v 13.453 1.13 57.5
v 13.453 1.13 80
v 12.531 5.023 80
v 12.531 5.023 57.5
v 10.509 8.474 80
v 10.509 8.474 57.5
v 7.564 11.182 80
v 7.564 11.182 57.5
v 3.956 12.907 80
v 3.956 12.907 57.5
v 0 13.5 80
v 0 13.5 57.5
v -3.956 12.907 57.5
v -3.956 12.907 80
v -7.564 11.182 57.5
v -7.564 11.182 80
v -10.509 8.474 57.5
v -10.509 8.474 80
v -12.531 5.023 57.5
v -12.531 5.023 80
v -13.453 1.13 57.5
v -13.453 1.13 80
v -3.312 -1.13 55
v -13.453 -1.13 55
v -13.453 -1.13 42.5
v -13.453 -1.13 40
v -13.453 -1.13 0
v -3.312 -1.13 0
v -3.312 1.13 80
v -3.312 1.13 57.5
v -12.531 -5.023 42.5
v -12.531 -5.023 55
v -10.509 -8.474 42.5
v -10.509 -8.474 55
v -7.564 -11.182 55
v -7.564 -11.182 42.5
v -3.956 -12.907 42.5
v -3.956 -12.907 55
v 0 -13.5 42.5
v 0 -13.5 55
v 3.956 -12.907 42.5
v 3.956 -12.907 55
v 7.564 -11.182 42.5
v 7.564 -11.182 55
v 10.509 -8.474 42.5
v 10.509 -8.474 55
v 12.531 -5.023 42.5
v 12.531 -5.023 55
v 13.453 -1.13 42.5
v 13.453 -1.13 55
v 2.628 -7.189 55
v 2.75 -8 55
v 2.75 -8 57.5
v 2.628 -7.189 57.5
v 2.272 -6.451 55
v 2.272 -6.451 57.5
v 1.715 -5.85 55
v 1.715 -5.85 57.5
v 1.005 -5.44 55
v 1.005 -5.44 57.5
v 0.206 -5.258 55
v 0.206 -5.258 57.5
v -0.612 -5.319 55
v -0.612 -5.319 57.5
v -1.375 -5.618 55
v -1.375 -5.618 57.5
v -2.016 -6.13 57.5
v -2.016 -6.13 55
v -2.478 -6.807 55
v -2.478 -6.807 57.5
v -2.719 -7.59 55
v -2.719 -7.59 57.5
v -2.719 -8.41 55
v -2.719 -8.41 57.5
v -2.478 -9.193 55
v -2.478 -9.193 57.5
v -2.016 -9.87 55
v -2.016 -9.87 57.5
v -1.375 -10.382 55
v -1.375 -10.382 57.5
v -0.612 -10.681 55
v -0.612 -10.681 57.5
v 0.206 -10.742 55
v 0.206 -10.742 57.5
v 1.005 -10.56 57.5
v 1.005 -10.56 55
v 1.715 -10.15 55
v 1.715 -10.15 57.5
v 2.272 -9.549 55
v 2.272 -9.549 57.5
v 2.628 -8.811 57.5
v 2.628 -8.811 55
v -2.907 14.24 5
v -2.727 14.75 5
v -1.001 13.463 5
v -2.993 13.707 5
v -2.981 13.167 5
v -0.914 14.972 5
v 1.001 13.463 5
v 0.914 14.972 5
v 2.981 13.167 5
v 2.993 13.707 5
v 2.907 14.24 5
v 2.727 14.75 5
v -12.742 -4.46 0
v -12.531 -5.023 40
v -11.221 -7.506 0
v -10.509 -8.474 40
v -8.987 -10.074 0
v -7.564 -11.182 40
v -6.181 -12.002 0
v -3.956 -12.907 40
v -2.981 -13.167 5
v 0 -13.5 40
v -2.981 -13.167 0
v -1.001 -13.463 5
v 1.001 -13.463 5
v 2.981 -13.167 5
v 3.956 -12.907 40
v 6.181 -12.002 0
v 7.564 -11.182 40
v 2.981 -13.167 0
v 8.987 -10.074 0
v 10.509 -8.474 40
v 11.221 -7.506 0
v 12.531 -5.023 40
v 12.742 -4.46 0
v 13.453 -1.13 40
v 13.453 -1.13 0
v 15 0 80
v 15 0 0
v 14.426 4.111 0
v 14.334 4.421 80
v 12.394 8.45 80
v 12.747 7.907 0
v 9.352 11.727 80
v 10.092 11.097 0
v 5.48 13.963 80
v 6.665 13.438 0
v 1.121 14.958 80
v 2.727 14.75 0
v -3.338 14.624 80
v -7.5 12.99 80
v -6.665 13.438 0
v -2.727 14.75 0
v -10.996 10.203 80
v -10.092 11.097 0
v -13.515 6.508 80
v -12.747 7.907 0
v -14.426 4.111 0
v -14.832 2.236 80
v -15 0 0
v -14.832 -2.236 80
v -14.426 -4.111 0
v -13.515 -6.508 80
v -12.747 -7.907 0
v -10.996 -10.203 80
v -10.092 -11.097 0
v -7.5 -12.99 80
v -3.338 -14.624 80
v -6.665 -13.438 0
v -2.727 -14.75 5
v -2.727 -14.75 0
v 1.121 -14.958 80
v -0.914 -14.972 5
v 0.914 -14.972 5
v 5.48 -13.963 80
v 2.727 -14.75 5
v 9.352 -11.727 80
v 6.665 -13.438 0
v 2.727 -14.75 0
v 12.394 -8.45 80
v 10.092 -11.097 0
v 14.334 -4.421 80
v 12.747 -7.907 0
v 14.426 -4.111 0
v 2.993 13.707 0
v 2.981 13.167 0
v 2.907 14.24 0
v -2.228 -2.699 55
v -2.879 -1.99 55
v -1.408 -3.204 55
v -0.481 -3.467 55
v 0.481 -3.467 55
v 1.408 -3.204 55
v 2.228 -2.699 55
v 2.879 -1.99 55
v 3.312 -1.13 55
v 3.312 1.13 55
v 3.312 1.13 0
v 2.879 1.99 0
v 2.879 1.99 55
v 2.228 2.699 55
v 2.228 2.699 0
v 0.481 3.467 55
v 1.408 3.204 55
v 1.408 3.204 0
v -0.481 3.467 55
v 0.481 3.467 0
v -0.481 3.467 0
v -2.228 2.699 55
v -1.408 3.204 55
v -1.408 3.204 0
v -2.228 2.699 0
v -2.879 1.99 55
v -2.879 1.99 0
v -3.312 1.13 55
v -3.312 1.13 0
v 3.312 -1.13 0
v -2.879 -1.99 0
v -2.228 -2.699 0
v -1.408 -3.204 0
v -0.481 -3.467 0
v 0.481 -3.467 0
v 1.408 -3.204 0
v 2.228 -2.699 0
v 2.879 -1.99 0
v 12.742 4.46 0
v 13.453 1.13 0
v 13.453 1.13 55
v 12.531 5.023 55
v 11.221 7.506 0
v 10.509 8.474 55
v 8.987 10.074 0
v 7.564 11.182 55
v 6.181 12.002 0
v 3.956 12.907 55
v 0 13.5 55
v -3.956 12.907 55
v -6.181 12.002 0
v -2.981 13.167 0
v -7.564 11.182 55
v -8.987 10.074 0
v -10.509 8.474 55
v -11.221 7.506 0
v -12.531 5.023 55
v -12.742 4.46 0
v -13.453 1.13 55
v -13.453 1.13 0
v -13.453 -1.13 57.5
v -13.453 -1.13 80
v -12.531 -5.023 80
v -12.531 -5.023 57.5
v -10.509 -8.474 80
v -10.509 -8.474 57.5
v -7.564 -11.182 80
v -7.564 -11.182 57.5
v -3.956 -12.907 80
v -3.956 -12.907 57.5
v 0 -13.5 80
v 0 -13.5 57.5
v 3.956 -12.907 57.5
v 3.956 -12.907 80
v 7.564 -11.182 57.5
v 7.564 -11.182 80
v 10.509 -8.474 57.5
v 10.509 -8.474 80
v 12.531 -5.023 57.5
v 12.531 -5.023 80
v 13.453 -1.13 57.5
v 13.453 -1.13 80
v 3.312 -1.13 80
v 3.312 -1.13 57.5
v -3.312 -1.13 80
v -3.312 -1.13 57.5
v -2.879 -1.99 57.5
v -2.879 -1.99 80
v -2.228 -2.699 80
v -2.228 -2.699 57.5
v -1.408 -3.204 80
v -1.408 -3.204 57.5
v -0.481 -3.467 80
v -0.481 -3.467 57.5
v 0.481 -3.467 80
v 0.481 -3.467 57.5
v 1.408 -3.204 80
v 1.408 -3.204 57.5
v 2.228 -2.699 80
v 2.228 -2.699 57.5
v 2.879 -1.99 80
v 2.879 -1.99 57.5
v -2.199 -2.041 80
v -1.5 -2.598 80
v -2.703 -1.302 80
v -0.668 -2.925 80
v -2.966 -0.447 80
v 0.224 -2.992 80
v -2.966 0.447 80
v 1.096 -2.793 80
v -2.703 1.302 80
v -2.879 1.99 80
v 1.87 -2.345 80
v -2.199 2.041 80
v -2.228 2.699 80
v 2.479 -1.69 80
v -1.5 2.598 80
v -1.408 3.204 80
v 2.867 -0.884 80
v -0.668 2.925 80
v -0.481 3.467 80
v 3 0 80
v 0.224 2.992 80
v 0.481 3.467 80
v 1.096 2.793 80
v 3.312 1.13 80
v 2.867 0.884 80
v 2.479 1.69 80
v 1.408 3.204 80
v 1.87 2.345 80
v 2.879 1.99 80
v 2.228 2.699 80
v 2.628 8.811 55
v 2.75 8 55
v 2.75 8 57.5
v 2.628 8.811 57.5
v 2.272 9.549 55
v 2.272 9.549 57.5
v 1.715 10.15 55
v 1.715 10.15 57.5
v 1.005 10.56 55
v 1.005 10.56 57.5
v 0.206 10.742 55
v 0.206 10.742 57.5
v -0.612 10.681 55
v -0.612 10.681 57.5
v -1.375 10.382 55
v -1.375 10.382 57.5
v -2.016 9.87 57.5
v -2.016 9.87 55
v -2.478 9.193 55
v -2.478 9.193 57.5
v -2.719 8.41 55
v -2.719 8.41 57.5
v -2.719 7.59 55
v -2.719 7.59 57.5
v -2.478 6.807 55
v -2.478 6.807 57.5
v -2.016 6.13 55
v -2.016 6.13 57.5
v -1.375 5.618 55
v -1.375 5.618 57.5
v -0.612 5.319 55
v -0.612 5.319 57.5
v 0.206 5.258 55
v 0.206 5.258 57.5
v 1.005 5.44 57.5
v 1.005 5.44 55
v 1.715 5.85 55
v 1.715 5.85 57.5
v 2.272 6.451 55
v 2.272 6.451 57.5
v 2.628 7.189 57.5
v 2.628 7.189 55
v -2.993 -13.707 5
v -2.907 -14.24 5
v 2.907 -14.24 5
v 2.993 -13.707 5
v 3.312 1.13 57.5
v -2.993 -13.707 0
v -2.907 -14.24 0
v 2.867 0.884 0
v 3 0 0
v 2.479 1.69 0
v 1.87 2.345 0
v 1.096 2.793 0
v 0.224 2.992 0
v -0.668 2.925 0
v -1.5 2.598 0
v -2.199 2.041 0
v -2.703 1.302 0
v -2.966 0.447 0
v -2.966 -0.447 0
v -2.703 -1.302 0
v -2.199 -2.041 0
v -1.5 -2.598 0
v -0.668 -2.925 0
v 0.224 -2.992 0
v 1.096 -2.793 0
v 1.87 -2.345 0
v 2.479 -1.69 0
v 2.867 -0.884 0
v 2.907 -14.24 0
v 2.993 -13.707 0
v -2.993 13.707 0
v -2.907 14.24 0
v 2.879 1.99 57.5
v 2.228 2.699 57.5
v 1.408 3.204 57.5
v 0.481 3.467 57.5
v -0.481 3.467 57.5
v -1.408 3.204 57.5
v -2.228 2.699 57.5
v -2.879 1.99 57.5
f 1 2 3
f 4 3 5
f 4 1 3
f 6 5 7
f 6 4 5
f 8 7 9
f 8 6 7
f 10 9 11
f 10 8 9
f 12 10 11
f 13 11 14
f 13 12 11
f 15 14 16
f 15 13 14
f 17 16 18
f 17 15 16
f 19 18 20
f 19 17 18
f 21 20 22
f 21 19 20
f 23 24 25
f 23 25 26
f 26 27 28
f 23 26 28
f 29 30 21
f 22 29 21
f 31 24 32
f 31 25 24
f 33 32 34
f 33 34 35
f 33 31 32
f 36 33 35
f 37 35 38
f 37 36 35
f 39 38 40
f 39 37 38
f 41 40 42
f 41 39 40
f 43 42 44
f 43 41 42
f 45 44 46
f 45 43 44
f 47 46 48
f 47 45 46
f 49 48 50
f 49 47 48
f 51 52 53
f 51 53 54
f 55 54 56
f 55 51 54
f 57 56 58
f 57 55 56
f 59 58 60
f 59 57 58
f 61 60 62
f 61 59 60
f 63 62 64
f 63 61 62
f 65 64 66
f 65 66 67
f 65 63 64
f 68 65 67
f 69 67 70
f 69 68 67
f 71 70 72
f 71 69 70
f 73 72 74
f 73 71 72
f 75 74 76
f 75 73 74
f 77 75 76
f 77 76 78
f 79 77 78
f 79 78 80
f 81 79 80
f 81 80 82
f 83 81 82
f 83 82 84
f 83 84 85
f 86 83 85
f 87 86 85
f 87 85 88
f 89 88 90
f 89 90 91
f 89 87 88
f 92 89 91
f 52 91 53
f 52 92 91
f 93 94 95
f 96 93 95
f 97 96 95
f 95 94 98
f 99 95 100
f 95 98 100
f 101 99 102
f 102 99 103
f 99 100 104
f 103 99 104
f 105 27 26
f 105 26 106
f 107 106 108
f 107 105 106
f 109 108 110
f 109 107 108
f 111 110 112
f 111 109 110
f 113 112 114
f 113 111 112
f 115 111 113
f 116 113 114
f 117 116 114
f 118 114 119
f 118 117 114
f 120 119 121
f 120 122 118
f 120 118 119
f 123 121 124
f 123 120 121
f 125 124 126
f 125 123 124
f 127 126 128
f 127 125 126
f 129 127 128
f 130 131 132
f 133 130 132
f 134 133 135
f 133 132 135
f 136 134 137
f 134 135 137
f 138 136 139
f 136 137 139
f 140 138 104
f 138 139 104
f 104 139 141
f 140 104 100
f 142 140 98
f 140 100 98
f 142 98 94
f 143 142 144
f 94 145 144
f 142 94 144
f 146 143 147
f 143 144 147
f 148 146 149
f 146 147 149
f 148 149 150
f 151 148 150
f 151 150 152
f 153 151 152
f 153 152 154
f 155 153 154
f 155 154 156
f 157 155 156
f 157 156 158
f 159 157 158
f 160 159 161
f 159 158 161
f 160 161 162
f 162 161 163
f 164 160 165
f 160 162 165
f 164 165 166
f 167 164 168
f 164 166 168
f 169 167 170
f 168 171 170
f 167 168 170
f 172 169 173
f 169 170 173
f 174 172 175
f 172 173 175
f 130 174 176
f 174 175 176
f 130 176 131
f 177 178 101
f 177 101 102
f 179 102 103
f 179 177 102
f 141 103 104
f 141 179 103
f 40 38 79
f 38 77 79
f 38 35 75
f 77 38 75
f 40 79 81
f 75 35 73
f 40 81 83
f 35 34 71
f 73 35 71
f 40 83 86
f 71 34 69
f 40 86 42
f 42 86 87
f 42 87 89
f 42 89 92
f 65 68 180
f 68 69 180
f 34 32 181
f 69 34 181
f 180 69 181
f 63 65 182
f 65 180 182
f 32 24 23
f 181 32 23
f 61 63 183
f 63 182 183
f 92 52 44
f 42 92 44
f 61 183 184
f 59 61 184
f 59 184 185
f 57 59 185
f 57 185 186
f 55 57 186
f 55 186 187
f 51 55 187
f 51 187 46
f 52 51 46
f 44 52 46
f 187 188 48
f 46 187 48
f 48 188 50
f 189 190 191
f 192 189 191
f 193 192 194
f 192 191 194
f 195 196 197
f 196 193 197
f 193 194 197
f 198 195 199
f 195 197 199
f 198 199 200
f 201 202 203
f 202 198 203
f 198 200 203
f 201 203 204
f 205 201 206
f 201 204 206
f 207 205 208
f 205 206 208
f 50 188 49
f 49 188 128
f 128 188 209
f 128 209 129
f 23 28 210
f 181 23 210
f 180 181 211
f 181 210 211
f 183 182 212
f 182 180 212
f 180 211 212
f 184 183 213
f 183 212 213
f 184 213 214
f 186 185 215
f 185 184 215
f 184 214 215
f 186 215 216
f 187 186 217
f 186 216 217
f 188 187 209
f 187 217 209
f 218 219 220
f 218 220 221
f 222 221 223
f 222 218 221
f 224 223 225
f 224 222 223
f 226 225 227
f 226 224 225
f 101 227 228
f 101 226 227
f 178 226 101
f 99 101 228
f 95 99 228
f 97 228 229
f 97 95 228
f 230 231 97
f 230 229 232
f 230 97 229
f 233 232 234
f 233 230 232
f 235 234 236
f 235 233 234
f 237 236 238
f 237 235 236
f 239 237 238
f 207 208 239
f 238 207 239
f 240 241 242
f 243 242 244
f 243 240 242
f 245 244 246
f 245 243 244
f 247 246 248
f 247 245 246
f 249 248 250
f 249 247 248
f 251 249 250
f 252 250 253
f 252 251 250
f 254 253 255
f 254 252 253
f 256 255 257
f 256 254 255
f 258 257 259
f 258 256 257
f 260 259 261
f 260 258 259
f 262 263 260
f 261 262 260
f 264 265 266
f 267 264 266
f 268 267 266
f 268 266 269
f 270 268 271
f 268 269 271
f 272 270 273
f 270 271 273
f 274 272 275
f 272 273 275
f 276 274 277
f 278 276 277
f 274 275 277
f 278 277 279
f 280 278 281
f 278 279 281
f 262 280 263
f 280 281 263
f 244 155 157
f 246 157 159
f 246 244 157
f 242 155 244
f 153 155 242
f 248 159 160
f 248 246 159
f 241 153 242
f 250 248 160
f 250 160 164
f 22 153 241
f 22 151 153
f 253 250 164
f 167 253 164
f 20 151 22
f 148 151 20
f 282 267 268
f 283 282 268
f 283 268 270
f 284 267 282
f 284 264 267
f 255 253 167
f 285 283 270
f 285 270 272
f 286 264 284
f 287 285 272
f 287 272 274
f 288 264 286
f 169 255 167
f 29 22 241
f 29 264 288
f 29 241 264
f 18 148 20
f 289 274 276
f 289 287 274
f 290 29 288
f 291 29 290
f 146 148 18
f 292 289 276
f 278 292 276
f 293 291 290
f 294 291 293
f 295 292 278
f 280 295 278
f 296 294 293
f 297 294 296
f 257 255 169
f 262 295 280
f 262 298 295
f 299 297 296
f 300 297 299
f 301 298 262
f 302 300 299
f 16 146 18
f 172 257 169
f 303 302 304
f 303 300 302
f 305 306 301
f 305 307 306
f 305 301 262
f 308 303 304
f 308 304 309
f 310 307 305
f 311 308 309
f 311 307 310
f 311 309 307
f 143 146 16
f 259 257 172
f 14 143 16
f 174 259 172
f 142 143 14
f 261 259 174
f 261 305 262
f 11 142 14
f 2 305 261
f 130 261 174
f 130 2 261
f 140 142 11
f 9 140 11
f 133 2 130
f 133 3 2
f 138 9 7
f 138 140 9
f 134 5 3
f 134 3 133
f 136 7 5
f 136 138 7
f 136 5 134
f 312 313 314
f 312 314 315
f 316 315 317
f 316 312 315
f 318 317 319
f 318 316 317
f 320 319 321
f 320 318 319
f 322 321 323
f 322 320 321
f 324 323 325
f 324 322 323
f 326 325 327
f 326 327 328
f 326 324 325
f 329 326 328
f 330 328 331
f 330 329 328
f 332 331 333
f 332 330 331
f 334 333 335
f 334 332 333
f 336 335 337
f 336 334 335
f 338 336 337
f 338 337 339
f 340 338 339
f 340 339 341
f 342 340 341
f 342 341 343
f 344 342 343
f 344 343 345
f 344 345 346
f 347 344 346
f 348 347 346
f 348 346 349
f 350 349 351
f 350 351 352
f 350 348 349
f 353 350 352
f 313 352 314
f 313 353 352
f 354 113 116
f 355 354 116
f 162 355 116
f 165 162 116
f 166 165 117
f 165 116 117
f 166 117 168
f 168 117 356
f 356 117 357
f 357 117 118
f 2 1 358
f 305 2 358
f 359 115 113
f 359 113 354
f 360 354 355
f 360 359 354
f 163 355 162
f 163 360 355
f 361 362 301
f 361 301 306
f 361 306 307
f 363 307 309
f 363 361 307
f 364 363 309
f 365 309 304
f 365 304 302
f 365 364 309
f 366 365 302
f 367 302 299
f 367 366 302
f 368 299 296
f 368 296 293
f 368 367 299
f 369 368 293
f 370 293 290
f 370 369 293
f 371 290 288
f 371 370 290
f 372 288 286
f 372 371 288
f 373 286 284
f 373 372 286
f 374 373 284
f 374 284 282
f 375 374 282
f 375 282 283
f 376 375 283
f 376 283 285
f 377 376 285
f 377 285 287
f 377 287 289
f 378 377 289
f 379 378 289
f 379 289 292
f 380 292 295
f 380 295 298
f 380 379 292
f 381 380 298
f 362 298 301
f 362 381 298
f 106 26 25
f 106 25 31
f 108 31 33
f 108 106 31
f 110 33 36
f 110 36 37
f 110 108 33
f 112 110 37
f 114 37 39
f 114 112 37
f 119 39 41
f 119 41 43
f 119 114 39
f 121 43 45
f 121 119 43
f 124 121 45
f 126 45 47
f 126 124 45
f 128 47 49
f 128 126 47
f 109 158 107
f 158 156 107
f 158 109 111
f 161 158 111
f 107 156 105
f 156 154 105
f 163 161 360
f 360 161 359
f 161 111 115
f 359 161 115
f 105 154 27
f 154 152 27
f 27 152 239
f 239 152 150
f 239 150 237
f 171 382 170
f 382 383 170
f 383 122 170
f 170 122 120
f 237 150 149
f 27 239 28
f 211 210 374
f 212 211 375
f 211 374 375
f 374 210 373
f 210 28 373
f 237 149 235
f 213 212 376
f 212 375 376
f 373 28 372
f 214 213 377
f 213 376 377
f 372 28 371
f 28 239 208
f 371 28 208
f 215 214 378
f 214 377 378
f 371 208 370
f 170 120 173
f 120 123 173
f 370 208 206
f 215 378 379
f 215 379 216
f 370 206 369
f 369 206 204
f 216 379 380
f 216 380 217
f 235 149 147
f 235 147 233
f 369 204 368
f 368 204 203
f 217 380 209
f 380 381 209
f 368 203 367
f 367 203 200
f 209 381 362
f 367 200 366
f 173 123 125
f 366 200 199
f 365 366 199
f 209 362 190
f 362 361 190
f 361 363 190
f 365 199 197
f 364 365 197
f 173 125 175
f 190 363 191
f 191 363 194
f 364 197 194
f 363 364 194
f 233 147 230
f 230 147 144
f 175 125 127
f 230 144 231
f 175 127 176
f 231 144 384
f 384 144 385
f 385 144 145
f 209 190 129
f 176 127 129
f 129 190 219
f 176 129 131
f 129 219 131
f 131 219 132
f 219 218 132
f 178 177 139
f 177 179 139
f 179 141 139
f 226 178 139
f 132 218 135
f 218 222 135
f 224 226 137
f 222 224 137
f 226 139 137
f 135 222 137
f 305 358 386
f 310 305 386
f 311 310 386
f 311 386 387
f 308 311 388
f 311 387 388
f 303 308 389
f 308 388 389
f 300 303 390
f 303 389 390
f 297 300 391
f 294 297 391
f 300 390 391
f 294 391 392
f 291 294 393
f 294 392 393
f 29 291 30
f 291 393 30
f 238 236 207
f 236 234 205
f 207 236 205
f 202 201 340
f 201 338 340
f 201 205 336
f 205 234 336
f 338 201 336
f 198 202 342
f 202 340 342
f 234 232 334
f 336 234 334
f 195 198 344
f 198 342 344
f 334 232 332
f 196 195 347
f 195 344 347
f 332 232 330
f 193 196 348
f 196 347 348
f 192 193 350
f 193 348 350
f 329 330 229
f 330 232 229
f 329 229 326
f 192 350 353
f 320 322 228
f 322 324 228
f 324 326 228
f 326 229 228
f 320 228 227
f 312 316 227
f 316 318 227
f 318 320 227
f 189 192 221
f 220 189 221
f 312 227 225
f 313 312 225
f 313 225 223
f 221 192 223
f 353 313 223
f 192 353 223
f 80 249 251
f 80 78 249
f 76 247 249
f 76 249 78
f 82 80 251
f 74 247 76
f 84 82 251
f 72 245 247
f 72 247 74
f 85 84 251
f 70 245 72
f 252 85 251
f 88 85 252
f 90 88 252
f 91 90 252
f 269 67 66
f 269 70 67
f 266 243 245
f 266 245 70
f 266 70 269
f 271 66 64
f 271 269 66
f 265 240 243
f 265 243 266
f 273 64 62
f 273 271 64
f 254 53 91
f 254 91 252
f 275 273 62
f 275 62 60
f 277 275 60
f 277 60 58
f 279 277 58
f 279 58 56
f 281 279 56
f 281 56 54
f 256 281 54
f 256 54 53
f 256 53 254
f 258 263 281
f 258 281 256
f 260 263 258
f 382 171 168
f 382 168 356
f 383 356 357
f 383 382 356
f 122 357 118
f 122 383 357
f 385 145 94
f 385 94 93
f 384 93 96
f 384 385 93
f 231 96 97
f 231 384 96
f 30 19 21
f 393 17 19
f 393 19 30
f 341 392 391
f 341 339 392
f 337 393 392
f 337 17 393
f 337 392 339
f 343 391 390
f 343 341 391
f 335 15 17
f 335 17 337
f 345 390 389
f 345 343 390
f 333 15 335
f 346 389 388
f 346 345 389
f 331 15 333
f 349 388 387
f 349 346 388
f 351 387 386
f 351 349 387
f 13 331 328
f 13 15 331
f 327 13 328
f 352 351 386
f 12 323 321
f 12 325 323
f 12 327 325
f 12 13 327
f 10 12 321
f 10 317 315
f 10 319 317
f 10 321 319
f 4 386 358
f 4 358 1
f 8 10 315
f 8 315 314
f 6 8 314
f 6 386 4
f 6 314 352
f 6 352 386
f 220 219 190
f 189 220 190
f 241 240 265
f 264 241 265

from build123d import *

# Parameters (mm, degrees)
SKETCH2_R              = 15
SKETCH2_R_2            = 13.5
SKETCH2_R_3            = 3
SHELL_DEPTH            = 80
SKETCH8_R              = 2.75
INNERPARTITION_DEPTH   = 2.5
MOVE_START             = 40
MOVE_FACE6_OUTLINE_R   = 2.75
MOVE_FACE6_DEPTH       = 2.5
MOVE_START_2           = 55
MOVE_FACE6_2_OUTLINE_R = 2.75
MOVE_FACE6_2_DEPTH     = 2.5
EASIER_ASSEMBLY_DEPTH  = 5


# Read off the part's stored shape, not the designer's step: Move Face6
with BuildPart() as part:
    # Sketch2 → Shell (new body)
    # profile 1 of 6: a face of its own
    with BuildSketch(Plane.XY):
        Circle(SKETCH2_R)
        Circle(SKETCH2_R_2, mode=Mode.SUBTRACT)
    # profile 2 of 6: a face of its own
    with BuildSketch(Plane.XY):
        with BuildLine():
            ThreePointArc((-2.727178029, 14.75), (-2.962055082, 13.975636094), (-2.98142397, 13.166666667))
            ThreePointArc((-2.98142397, 13.166666667), (0, 13.5), (2.98142397, 13.166666667))
            ThreePointArc((2.98142397, 13.166666667), (2.962055082, 13.975636094), (2.727178029, 14.75))
            ThreePointArc((2.727178029, 14.75), (0, 15), (-2.727178029, 14.75))
        make_face()
    # profile 3 of 6: a face of its own
    with BuildSketch(Plane.XY):
        with BuildLine():
            ThreePointArc((-13.452587926, -1.130432705), (-13.5, 0), (-13.452587926, 1.130432705))
            ThreePointArc((-13.452587926, 1.130432705), (-10.18513224, 8.860760761), (-2.98142397, 13.166666667))
            ThreePointArc((-2.98142397, 13.166666667), (-2.962055082, 13.975636094), (-2.727178029, 14.75))
            ThreePointArc((-2.727178029, 14.75), (-15, 0), (-2.727178029, -14.75))
            ThreePointArc((-2.727178029, -14.75), (-2.962055082, -13.975636094), (-2.98142397, -13.166666667))
            ThreePointArc((-2.98142397, -13.166666667), (-10.18513224, -8.860760761), (-13.452587926, -1.130432705))
        make_face()
    # profile 4 of 6: a face of its own
    with BuildSketch(Plane.XY):
        with BuildLine():
            ThreePointArc((2.727178029, 14.75), (2.962055082, 13.975636094), (2.98142397, 13.166666667))
            ThreePointArc((2.98142397, 13.166666667), (10.18513224, 8.860760761), (13.452587926, 1.130432705))
            ThreePointArc((13.452587926, 1.130432705), (13.488141773, 0.565713268), (13.5, 0))
            ThreePointArc((13.5, 0), (13.488141773, -0.565713268), (13.452587926, -1.130432705))
            ThreePointArc((13.452587926, -1.130432705), (10.18513224, -8.860760761), (2.98142397, -13.166666667))
            ThreePointArc((2.98142397, -13.166666667), (2.962055082, -13.975636094), (2.727178029, -14.75))
            ThreePointArc((2.727178029, -14.75), (11.530560924, -9.594069251), (15, 0))
            ThreePointArc((15, 0), (11.530560924, 9.594069251), (2.727178029, 14.75))
        make_face()
    # profile 5 of 6: a face of its own
    with BuildSketch(Plane.XY):
        with BuildLine():
            ThreePointArc((2.98142397, -13.166666667), (0, -13.5), (-2.98142397, -13.166666667))
            ThreePointArc((-2.98142397, -13.166666667), (-2.962055082, -13.975636094), (-2.727178029, -14.75))
            ThreePointArc((-2.727178029, -14.75), (0, -15), (2.727178029, -14.75))
            ThreePointArc((2.727178029, -14.75), (2.962055082, -13.975636094), (2.98142397, -13.166666667))
        make_face()
    # profile 6 of 6: a face of its own
    with BuildSketch(Plane.XY):
        with BuildLine():
            Line((-3.312419342, 1.130432705), (-13.452587926, 1.130432705))
            ThreePointArc((-13.452587926, 1.130432705), (-13.5, 0), (-13.452587926, -1.130432705))
            Line((-13.452587926, -1.130432705), (-3.312419342, -1.130432705))
            ThreePointArc((-3.312419342, -1.130432705), (0, -3.5), (3.312419342, -1.130432705))
            Line((3.312419342, -1.130432705), (13.452587926, -1.130432705))
            ThreePointArc((13.452587926, -1.130432705), (13.488141773, -0.565713268), (13.5, 0))
            ThreePointArc((13.5, 0), (13.488141773, 0.565713268), (13.452587926, 1.130432705))
            Line((13.452587926, 1.130432705), (3.312419342, 1.130432705))
            ThreePointArc((3.312419342, 1.130432705), (0, 3.5), (-3.312419342, 1.130432705))
        make_face()
        Circle(SKETCH2_R_3, mode=Mode.SUBTRACT)
    extrude(amount=SHELL_DEPTH)

    # Sketch8 → InnerPartition (add)
    # profile 1 of 2: a face of its own
    with BuildSketch(Plane.XY.offset(40)):
        with BuildLine():
            ThreePointArc((13.452587926, 1.130432705), (0, 13.5), (-13.452587926, 1.130432705))
            Line((-13.452587926, 1.130432705), (-3.312419342, 1.130432705))
            ThreePointArc((-3.312419342, 1.130432705), (0, 3.5), (3.312419342, 1.130432705))
            Line((3.312419342, 1.130432705), (13.452587926, 1.130432705))
        make_face()
        with Locations((0, 8)):
            Circle(SKETCH8_R, mode=Mode.SUBTRACT)
    # profile 2 of 2: a face of its own
    with BuildSketch(Plane.XY.offset(40)):
        with BuildLine():
            Line((-3.312419342, -1.130432705), (-13.452587926, -1.130432705))
            ThreePointArc((-13.452587926, -1.130432705), (0, -13.5), (13.452587926, -1.130432705))
            Line((13.452587926, -1.130432705), (3.312419342, -1.130432705))
            ThreePointArc((3.312419342, -1.130432705), (0, -3.5), (-3.312419342, -1.130432705))
        make_face()
        with Locations((0, -8)):
            Circle(SKETCH8_R, mode=Mode.SUBTRACT)
    extrude(amount=INNERPARTITION_DEPTH)

    # Move Face6 outline → Move Face6 (cut)
    # profile 1 of 2: a face of its own
    with BuildSketch(Plane.XY.offset(MOVE_START)):
        with BuildLine():
            ThreePointArc((-13.452587926, -1.130432705), (0, -13.5), (13.452587926, -1.130432705))
            Line((13.452587926, -1.130432705), (3.312419342, -1.130432705))
            ThreePointArc((3.312419342, -1.130432705), (0, -3.5), (-3.312419342, -1.130432705))
            Line((-3.312419342, -1.130432705), (-13.452587926, -1.130432705))
        make_face()
        with Locations((0, -8)):
            Circle(MOVE_FACE6_OUTLINE_R, mode=Mode.SUBTRACT)
    # profile 2 of 2: a face of its own
    with BuildSketch(Plane.XY.offset(MOVE_START)):
        with BuildLine():
            ThreePointArc((13.452587926, 1.130432705), (0, 13.5), (-13.452587926, 1.130432705))
            Line((-13.452587926, 1.130432705), (-3.312419342, 1.130432705))
            ThreePointArc((-3.312419342, 1.130432705), (0, 3.5), (3.312419342, 1.130432705))
            Line((3.312419342, 1.130432705), (13.452587926, 1.130432705))
        make_face()
        with Locations((0, 8)):
            Circle(MOVE_FACE6_OUTLINE_R, mode=Mode.SUBTRACT)
    extrude(amount=MOVE_FACE6_DEPTH, mode=Mode.SUBTRACT)

    # Move Face6 2 outline → Move Face6 2 (add)
    # profile 1 of 2: a face of its own
    with BuildSketch(Plane.XY.offset(MOVE_START_2)):
        with BuildLine():
            ThreePointArc((-13.452587926, -1.130432705), (0, -13.5), (13.452587926, -1.130432705))
            Line((13.452587926, -1.130432705), (3.312419342, -1.130432705))
            ThreePointArc((3.312419342, -1.130432705), (0, -3.5), (-3.312419342, -1.130432705))
            Line((-3.312419342, -1.130432705), (-13.452587926, -1.130432705))
        make_face()
        with Locations((0, -8)):
            Circle(MOVE_FACE6_2_OUTLINE_R, mode=Mode.SUBTRACT)
    # profile 2 of 2: a face of its own
    with BuildSketch(Plane.XY.offset(MOVE_START_2)):
        with BuildLine():
            ThreePointArc((13.452587926, 1.130432705), (0, 13.5), (-13.452587926, 1.130432705))
            Line((-13.452587926, 1.130432705), (-3.312419342, 1.130432705))
            ThreePointArc((-3.312419342, 1.130432705), (0, 3.5), (3.312419342, 1.130432705))
            Line((3.312419342, 1.130432705), (13.452587926, 1.130432705))
        make_face()
        with Locations((0, 8)):
            Circle(MOVE_FACE6_2_OUTLINE_R, mode=Mode.SUBTRACT)
    extrude(amount=MOVE_FACE6_2_DEPTH)

    # Sketch2<12> → Easier assembly (cut)
    with BuildSketch(Plane.XY):
        with BuildLine():
            ThreePointArc((-2.727178029, 14.75), (-2.962055082, 13.975636094), (-2.98142397, 13.166666667))
            ThreePointArc((-2.98142397, 13.166666667), (0, 13.5), (2.98142397, 13.166666667))
            ThreePointArc((2.98142397, 13.166666667), (2.962055082, 13.975636094), (2.727178029, 14.75))
            ThreePointArc((2.727178029, 14.75), (0, 15), (-2.727178029, 14.75))
        make_face()
        with BuildLine():
            ThreePointArc((2.98142397, -13.166666667), (0, -13.5), (-2.98142397, -13.166666667))
            ThreePointArc((-2.98142397, -13.166666667), (-2.962055082, -13.975636094), (-2.727178029, -14.75))
            ThreePointArc((-2.727178029, -14.75), (0, -15), (2.727178029, -14.75))
            ThreePointArc((2.727178029, -14.75), (2.962055082, -13.975636094), (2.98142397, -13.166666667))
        make_face()
    extrude(amount=EASIER_ASSEMBLY_DEPTH, mode=Mode.SUBTRACT)


solid = part.part
